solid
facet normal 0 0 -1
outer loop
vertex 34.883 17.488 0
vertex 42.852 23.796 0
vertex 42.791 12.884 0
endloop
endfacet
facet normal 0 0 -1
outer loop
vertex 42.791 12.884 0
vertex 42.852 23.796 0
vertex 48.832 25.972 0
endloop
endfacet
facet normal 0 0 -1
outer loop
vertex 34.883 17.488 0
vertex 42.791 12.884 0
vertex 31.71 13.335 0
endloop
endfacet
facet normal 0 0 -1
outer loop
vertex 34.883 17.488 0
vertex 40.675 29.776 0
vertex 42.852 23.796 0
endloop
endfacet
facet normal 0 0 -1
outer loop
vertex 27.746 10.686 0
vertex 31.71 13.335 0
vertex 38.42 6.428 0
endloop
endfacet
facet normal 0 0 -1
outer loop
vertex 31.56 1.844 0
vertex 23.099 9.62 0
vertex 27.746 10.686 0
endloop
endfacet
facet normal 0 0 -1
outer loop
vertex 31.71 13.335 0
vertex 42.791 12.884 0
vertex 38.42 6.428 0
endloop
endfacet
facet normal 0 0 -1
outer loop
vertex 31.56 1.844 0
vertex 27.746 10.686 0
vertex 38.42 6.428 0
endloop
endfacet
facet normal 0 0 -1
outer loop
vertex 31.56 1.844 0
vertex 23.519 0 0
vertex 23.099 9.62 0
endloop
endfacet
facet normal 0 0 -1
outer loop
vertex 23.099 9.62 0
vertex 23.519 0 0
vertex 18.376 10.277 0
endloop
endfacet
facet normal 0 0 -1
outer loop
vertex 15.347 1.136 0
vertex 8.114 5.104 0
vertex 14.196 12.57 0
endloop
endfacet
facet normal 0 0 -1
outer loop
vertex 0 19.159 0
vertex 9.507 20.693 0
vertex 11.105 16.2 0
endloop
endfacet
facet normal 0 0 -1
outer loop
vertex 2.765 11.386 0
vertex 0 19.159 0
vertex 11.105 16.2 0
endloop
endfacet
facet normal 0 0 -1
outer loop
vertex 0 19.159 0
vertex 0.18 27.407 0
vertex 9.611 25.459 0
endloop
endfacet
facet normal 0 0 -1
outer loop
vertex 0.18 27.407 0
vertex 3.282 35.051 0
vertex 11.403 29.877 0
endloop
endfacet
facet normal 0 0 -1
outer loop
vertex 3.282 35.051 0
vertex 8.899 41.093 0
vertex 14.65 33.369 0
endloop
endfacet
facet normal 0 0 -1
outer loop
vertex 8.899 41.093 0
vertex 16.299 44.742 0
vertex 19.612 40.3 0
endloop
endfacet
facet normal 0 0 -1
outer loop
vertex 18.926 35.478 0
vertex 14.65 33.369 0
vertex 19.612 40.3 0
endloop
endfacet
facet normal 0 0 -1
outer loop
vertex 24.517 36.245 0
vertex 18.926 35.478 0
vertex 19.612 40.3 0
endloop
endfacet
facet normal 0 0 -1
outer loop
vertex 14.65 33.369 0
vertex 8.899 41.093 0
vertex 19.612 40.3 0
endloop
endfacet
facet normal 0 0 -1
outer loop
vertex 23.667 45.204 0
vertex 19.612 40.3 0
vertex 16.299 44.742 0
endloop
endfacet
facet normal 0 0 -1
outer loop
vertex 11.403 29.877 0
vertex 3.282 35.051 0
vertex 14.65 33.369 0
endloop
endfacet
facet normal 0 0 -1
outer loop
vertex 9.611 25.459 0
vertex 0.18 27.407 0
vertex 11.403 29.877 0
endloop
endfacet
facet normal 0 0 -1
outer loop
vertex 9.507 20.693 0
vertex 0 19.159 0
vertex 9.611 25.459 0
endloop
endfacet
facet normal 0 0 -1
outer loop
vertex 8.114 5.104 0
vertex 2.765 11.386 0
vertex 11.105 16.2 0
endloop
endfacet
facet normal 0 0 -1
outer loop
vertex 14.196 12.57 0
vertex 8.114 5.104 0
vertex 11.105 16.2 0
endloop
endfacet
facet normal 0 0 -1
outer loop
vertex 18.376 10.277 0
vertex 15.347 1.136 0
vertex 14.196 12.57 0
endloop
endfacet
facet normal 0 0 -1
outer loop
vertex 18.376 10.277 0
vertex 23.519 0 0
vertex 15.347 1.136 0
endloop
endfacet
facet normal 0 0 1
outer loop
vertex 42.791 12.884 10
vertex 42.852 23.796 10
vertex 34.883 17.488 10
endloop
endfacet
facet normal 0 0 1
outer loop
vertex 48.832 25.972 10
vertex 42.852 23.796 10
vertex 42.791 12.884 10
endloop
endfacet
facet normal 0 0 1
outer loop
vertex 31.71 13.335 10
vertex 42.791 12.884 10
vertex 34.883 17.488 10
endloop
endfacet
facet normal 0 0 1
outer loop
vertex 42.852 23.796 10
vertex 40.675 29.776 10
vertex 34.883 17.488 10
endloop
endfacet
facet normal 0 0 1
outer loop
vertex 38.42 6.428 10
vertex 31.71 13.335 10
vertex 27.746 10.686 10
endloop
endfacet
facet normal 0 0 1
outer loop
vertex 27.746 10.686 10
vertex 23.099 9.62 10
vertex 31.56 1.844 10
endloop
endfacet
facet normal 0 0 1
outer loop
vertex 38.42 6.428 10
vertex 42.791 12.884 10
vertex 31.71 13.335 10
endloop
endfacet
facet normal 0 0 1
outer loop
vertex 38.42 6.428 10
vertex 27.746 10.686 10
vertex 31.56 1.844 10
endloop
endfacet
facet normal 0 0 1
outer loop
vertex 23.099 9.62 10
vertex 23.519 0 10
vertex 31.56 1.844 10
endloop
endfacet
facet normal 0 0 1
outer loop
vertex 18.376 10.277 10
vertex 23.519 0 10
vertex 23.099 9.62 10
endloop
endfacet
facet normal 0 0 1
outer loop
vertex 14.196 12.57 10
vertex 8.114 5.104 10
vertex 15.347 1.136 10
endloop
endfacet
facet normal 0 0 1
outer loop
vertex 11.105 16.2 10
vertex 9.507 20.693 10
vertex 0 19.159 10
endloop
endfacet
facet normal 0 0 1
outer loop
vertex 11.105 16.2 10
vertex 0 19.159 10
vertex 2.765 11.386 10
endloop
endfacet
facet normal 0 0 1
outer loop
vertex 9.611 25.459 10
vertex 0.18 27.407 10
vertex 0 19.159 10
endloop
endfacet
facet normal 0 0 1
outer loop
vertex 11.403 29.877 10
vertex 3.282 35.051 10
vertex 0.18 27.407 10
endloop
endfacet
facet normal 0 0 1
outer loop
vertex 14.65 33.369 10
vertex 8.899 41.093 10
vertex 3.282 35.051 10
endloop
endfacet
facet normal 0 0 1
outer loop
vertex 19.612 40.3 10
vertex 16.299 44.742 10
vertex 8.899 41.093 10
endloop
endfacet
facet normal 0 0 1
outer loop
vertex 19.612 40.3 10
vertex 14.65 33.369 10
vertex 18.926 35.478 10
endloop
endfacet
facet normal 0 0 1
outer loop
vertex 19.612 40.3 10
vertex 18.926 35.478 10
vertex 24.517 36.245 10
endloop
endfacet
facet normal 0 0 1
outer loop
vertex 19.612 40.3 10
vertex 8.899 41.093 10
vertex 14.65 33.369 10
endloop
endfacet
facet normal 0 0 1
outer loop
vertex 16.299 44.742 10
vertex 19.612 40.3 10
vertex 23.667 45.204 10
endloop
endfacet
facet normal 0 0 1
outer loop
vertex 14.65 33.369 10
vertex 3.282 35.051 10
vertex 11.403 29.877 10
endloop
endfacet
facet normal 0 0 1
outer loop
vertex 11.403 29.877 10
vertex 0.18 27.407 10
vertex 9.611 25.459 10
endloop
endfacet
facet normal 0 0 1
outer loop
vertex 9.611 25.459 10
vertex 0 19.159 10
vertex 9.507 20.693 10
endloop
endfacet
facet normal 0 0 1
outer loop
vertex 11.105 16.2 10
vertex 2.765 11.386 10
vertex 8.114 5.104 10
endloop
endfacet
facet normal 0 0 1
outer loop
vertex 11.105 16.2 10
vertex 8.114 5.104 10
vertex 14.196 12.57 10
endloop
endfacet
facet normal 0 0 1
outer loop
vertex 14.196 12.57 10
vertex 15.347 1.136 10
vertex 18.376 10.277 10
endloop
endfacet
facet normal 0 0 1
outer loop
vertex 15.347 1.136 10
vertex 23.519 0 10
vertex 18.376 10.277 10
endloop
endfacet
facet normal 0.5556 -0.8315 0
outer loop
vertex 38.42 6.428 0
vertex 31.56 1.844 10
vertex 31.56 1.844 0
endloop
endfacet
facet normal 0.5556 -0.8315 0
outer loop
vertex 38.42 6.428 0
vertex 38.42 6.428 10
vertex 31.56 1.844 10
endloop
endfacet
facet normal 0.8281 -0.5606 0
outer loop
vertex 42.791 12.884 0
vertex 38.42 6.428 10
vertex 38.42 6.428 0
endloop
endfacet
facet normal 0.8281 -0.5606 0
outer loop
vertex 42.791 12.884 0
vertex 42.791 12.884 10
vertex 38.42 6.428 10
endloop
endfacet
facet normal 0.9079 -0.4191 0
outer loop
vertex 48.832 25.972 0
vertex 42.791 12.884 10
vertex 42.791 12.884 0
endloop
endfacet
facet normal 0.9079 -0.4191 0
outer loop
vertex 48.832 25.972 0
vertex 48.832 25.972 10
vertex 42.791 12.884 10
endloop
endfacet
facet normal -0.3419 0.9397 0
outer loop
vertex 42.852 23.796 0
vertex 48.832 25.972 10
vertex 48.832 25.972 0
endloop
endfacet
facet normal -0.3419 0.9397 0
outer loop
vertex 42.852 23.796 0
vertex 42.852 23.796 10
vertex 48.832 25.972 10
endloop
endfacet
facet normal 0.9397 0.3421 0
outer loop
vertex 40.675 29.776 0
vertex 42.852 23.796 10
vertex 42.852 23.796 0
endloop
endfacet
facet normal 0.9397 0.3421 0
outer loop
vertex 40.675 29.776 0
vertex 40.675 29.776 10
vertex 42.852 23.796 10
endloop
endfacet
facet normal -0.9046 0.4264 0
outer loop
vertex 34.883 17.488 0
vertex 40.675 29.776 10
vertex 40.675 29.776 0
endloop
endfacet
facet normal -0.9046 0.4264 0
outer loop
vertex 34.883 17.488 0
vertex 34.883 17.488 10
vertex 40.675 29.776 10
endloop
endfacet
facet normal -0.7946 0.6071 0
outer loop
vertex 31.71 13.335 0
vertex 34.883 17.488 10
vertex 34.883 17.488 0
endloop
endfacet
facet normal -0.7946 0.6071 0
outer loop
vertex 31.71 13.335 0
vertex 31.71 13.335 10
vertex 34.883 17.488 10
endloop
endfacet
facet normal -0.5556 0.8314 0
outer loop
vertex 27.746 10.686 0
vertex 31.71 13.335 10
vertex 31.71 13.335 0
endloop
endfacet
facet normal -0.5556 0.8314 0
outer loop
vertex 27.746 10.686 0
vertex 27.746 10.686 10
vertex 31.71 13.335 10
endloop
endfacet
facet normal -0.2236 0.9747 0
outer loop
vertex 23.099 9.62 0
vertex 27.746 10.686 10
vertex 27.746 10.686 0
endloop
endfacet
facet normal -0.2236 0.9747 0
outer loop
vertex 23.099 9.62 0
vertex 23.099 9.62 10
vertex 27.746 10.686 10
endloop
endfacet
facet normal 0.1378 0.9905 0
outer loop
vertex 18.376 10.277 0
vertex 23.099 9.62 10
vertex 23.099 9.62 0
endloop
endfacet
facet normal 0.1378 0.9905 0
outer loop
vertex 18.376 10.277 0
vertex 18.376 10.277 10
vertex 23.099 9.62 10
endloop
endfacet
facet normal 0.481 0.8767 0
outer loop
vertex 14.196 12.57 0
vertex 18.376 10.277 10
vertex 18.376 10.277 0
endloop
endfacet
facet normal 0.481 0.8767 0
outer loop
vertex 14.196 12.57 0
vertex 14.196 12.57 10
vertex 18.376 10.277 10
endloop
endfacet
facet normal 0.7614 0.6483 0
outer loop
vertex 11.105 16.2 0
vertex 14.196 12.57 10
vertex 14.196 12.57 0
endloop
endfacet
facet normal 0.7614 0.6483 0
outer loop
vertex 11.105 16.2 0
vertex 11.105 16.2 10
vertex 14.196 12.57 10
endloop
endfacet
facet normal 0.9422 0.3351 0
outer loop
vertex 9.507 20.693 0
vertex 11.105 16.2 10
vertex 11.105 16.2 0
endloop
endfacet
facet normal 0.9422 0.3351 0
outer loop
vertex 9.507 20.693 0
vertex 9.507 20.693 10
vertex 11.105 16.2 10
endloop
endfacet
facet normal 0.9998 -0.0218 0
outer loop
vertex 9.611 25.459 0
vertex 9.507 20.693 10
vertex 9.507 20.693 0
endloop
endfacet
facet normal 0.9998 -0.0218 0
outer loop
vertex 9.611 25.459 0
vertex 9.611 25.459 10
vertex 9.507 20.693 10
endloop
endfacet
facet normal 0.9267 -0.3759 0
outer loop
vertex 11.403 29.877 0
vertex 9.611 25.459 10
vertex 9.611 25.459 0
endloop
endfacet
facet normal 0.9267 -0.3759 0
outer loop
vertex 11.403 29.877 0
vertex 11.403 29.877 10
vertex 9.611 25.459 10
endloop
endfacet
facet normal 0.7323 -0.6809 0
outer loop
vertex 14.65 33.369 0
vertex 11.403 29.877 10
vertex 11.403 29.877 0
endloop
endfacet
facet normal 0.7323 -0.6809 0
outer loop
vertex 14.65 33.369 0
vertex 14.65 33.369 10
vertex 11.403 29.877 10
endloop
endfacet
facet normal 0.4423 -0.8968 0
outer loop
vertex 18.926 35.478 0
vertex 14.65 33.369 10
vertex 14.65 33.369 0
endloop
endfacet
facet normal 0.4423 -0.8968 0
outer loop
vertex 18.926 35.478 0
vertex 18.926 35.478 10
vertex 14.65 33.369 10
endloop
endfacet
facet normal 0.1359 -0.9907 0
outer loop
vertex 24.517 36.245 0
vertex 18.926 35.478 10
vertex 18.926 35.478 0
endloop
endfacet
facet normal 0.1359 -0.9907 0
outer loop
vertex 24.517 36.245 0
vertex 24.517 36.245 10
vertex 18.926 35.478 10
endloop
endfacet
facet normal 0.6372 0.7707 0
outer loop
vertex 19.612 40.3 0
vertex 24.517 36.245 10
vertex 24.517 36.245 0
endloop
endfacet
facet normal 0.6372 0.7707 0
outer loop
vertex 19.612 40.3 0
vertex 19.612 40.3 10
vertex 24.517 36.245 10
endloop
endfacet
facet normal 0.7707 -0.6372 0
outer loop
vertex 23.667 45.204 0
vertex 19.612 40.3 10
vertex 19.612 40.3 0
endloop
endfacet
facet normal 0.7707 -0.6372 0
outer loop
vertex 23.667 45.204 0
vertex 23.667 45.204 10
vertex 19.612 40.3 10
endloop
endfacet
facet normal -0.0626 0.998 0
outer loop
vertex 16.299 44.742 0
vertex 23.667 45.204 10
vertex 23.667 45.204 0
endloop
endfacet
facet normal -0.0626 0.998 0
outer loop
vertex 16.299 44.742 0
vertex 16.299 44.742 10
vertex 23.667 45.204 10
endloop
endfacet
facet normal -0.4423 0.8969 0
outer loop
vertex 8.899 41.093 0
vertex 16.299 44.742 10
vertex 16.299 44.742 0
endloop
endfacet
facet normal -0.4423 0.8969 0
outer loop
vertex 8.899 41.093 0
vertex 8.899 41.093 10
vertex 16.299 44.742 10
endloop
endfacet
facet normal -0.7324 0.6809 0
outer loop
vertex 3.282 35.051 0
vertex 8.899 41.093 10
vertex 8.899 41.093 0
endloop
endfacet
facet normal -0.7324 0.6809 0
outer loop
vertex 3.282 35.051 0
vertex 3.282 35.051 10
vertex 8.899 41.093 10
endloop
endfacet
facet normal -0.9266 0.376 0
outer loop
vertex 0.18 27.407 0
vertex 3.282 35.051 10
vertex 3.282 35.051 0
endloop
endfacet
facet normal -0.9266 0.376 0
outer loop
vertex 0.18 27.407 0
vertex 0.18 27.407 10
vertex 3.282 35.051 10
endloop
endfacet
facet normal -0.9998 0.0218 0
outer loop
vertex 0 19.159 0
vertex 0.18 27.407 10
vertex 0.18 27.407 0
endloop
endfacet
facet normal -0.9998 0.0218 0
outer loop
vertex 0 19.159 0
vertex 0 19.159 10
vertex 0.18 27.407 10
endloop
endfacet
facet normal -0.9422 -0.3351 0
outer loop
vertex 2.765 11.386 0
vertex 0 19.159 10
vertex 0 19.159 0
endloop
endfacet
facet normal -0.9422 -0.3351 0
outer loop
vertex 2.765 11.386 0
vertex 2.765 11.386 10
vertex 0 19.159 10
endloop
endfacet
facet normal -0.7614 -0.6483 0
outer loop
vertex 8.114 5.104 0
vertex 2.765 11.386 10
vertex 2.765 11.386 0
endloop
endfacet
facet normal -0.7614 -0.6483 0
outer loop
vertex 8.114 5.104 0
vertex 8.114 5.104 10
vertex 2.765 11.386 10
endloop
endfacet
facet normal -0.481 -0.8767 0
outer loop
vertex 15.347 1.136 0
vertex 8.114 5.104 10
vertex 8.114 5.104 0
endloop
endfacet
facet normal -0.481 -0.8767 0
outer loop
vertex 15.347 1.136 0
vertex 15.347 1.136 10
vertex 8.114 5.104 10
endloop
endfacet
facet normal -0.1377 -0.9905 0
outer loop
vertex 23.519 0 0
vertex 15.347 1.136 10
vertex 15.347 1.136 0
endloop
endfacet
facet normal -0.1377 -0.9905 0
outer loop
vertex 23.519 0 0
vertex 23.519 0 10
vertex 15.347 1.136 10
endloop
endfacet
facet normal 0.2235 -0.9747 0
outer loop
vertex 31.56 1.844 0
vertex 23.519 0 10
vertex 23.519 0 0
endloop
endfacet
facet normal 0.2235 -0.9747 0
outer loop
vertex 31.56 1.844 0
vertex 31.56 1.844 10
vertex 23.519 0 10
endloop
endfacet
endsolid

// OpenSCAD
$fn = 32;

// ----------------------------------------------------------------------
// Eye lug: ring_tail, 10 mm thick
// ----------------------------------------------------------------------

// --- parameters (mm) ---
profile_height = 10;      // extrusion height
profile_points = 30;      // points of the closed outline

profile = [[19.612, 40.3], [23.667, 45.204], [16.299, 44.742], [8.899, 41.093], [3.282, 35.051], [0.18, 27.407], [0, 19.159], [2.765, 11.386], [8.114, 5.104], [15.347, 1.136], [23.519, 0], [31.56, 1.844], [38.42, 6.428], [42.791, 12.884], [48.832, 25.972], [42.852, 23.796], [40.675, 29.776], [34.883, 17.488], [31.71, 13.335], [27.746, 10.686], [23.099, 9.62], [18.376, 10.277], [14.196, 12.57], [11.105, 16.2], [9.507, 20.693], [9.611, 25.459], [11.403, 29.877], [14.65, 33.369], [18.926, 35.478], [24.517, 36.245]];  // single closed polygon, 30 points, counter clockwise

// --- the one profile operation ---
linear_extrude(height = profile_height) polygon(points = profile);
